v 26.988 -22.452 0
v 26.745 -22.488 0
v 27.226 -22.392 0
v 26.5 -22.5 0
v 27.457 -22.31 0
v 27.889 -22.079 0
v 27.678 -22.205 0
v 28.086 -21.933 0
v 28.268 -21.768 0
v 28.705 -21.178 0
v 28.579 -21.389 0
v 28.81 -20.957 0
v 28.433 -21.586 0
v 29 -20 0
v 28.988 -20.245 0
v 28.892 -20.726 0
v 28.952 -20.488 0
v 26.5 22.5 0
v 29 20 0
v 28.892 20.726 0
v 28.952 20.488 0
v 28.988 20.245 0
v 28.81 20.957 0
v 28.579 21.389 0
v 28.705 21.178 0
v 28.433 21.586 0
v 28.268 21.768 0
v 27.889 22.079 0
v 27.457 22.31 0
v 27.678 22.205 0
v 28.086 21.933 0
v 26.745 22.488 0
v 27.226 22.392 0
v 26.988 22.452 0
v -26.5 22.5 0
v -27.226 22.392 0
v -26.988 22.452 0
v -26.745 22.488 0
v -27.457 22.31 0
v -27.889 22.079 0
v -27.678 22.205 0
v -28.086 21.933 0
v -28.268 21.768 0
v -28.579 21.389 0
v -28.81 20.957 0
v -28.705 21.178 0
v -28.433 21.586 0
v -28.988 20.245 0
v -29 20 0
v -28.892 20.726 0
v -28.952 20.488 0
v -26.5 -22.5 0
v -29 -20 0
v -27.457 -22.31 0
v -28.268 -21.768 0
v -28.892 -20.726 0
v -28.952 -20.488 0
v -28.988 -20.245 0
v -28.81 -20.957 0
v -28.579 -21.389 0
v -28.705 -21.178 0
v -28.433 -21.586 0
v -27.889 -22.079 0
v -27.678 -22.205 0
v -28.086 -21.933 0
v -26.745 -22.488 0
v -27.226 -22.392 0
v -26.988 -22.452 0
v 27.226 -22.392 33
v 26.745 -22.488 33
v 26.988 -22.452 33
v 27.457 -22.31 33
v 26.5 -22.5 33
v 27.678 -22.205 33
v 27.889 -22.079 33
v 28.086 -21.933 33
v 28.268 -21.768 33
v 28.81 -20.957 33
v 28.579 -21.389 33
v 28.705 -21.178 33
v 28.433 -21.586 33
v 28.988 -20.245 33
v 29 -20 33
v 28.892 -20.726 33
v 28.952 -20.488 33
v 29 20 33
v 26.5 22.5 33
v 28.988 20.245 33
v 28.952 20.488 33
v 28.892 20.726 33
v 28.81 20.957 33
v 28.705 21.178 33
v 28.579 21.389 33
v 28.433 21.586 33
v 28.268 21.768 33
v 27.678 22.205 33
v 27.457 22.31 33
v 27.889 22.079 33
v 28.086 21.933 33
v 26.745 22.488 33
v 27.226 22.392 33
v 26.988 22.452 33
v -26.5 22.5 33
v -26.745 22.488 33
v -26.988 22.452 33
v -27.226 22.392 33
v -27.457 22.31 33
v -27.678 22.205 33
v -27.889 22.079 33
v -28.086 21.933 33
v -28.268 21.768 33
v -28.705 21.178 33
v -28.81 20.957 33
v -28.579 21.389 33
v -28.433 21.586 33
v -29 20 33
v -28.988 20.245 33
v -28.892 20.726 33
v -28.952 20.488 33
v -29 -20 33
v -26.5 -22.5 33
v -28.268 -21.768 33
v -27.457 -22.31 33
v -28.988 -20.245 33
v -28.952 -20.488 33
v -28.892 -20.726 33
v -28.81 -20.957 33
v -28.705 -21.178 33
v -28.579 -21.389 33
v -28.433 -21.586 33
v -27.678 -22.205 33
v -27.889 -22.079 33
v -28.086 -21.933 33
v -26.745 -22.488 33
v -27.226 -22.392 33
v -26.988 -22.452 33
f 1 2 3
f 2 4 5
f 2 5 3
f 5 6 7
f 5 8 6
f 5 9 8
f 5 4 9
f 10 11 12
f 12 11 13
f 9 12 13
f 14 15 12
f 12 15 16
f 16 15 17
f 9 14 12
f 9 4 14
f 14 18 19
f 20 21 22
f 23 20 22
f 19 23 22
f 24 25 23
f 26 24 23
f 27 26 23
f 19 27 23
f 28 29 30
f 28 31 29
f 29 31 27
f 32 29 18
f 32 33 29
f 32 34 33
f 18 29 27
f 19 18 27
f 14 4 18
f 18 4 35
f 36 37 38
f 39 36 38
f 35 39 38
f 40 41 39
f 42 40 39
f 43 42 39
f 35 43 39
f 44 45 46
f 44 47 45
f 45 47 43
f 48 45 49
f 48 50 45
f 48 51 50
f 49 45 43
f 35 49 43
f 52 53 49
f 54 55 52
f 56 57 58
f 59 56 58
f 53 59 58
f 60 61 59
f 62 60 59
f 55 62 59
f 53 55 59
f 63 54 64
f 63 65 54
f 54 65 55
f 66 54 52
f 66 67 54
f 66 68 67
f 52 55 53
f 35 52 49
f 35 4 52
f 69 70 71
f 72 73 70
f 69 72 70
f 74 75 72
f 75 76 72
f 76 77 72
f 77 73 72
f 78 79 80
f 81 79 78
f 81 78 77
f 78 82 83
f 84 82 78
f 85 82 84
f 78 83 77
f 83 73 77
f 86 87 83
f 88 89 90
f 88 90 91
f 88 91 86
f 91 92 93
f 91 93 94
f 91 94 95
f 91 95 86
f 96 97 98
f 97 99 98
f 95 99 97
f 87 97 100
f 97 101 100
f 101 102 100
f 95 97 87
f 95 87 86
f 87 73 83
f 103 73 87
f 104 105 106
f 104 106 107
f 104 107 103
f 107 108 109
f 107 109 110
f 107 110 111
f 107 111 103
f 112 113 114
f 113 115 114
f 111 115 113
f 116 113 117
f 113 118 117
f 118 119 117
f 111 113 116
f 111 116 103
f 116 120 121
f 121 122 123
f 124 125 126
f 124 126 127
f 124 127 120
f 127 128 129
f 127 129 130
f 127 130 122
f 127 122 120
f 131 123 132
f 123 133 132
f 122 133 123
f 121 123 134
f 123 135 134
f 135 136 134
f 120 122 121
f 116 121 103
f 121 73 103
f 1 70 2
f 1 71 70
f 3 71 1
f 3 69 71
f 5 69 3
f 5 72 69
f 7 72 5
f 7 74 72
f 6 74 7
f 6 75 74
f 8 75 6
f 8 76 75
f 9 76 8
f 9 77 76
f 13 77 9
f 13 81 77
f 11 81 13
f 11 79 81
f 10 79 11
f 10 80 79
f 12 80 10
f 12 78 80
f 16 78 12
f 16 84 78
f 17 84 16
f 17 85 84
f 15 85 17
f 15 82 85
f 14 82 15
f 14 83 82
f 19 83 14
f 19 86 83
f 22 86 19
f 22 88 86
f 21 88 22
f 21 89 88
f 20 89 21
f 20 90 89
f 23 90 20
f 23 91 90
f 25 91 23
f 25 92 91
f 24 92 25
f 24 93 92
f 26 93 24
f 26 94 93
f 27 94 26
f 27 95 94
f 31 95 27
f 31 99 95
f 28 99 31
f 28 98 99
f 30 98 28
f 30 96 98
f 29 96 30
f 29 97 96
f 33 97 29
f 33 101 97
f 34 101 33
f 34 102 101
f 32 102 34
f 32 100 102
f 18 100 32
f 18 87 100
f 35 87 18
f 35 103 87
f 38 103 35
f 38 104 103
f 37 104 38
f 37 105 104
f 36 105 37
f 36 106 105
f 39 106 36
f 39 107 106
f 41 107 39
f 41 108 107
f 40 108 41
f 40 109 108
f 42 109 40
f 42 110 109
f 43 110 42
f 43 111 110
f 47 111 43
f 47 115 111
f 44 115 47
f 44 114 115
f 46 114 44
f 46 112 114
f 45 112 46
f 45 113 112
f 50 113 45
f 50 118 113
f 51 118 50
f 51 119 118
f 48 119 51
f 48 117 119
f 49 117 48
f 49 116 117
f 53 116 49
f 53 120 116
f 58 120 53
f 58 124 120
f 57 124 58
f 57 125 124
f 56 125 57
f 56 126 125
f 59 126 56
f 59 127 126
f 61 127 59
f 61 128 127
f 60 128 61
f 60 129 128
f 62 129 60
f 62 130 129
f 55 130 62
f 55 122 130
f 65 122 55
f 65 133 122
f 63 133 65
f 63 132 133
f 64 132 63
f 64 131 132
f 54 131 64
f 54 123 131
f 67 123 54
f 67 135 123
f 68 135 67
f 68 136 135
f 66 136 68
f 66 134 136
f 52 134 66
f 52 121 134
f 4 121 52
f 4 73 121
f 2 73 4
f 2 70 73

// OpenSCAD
$fn = 64;

module ssr_module(size=[58,45,33], corner_r=2.5) {
    x = size[0];
    y = size[1];
    z = size[2];

    // Rounded rectangular prism
    linear_extrude(height=z)
        offset(r=corner_r)
            square([x-2*corner_r, y-2*corner_r], center=true);
}

ssr_module([58.0, 45.0, 33.0], corner_r=2.5);
